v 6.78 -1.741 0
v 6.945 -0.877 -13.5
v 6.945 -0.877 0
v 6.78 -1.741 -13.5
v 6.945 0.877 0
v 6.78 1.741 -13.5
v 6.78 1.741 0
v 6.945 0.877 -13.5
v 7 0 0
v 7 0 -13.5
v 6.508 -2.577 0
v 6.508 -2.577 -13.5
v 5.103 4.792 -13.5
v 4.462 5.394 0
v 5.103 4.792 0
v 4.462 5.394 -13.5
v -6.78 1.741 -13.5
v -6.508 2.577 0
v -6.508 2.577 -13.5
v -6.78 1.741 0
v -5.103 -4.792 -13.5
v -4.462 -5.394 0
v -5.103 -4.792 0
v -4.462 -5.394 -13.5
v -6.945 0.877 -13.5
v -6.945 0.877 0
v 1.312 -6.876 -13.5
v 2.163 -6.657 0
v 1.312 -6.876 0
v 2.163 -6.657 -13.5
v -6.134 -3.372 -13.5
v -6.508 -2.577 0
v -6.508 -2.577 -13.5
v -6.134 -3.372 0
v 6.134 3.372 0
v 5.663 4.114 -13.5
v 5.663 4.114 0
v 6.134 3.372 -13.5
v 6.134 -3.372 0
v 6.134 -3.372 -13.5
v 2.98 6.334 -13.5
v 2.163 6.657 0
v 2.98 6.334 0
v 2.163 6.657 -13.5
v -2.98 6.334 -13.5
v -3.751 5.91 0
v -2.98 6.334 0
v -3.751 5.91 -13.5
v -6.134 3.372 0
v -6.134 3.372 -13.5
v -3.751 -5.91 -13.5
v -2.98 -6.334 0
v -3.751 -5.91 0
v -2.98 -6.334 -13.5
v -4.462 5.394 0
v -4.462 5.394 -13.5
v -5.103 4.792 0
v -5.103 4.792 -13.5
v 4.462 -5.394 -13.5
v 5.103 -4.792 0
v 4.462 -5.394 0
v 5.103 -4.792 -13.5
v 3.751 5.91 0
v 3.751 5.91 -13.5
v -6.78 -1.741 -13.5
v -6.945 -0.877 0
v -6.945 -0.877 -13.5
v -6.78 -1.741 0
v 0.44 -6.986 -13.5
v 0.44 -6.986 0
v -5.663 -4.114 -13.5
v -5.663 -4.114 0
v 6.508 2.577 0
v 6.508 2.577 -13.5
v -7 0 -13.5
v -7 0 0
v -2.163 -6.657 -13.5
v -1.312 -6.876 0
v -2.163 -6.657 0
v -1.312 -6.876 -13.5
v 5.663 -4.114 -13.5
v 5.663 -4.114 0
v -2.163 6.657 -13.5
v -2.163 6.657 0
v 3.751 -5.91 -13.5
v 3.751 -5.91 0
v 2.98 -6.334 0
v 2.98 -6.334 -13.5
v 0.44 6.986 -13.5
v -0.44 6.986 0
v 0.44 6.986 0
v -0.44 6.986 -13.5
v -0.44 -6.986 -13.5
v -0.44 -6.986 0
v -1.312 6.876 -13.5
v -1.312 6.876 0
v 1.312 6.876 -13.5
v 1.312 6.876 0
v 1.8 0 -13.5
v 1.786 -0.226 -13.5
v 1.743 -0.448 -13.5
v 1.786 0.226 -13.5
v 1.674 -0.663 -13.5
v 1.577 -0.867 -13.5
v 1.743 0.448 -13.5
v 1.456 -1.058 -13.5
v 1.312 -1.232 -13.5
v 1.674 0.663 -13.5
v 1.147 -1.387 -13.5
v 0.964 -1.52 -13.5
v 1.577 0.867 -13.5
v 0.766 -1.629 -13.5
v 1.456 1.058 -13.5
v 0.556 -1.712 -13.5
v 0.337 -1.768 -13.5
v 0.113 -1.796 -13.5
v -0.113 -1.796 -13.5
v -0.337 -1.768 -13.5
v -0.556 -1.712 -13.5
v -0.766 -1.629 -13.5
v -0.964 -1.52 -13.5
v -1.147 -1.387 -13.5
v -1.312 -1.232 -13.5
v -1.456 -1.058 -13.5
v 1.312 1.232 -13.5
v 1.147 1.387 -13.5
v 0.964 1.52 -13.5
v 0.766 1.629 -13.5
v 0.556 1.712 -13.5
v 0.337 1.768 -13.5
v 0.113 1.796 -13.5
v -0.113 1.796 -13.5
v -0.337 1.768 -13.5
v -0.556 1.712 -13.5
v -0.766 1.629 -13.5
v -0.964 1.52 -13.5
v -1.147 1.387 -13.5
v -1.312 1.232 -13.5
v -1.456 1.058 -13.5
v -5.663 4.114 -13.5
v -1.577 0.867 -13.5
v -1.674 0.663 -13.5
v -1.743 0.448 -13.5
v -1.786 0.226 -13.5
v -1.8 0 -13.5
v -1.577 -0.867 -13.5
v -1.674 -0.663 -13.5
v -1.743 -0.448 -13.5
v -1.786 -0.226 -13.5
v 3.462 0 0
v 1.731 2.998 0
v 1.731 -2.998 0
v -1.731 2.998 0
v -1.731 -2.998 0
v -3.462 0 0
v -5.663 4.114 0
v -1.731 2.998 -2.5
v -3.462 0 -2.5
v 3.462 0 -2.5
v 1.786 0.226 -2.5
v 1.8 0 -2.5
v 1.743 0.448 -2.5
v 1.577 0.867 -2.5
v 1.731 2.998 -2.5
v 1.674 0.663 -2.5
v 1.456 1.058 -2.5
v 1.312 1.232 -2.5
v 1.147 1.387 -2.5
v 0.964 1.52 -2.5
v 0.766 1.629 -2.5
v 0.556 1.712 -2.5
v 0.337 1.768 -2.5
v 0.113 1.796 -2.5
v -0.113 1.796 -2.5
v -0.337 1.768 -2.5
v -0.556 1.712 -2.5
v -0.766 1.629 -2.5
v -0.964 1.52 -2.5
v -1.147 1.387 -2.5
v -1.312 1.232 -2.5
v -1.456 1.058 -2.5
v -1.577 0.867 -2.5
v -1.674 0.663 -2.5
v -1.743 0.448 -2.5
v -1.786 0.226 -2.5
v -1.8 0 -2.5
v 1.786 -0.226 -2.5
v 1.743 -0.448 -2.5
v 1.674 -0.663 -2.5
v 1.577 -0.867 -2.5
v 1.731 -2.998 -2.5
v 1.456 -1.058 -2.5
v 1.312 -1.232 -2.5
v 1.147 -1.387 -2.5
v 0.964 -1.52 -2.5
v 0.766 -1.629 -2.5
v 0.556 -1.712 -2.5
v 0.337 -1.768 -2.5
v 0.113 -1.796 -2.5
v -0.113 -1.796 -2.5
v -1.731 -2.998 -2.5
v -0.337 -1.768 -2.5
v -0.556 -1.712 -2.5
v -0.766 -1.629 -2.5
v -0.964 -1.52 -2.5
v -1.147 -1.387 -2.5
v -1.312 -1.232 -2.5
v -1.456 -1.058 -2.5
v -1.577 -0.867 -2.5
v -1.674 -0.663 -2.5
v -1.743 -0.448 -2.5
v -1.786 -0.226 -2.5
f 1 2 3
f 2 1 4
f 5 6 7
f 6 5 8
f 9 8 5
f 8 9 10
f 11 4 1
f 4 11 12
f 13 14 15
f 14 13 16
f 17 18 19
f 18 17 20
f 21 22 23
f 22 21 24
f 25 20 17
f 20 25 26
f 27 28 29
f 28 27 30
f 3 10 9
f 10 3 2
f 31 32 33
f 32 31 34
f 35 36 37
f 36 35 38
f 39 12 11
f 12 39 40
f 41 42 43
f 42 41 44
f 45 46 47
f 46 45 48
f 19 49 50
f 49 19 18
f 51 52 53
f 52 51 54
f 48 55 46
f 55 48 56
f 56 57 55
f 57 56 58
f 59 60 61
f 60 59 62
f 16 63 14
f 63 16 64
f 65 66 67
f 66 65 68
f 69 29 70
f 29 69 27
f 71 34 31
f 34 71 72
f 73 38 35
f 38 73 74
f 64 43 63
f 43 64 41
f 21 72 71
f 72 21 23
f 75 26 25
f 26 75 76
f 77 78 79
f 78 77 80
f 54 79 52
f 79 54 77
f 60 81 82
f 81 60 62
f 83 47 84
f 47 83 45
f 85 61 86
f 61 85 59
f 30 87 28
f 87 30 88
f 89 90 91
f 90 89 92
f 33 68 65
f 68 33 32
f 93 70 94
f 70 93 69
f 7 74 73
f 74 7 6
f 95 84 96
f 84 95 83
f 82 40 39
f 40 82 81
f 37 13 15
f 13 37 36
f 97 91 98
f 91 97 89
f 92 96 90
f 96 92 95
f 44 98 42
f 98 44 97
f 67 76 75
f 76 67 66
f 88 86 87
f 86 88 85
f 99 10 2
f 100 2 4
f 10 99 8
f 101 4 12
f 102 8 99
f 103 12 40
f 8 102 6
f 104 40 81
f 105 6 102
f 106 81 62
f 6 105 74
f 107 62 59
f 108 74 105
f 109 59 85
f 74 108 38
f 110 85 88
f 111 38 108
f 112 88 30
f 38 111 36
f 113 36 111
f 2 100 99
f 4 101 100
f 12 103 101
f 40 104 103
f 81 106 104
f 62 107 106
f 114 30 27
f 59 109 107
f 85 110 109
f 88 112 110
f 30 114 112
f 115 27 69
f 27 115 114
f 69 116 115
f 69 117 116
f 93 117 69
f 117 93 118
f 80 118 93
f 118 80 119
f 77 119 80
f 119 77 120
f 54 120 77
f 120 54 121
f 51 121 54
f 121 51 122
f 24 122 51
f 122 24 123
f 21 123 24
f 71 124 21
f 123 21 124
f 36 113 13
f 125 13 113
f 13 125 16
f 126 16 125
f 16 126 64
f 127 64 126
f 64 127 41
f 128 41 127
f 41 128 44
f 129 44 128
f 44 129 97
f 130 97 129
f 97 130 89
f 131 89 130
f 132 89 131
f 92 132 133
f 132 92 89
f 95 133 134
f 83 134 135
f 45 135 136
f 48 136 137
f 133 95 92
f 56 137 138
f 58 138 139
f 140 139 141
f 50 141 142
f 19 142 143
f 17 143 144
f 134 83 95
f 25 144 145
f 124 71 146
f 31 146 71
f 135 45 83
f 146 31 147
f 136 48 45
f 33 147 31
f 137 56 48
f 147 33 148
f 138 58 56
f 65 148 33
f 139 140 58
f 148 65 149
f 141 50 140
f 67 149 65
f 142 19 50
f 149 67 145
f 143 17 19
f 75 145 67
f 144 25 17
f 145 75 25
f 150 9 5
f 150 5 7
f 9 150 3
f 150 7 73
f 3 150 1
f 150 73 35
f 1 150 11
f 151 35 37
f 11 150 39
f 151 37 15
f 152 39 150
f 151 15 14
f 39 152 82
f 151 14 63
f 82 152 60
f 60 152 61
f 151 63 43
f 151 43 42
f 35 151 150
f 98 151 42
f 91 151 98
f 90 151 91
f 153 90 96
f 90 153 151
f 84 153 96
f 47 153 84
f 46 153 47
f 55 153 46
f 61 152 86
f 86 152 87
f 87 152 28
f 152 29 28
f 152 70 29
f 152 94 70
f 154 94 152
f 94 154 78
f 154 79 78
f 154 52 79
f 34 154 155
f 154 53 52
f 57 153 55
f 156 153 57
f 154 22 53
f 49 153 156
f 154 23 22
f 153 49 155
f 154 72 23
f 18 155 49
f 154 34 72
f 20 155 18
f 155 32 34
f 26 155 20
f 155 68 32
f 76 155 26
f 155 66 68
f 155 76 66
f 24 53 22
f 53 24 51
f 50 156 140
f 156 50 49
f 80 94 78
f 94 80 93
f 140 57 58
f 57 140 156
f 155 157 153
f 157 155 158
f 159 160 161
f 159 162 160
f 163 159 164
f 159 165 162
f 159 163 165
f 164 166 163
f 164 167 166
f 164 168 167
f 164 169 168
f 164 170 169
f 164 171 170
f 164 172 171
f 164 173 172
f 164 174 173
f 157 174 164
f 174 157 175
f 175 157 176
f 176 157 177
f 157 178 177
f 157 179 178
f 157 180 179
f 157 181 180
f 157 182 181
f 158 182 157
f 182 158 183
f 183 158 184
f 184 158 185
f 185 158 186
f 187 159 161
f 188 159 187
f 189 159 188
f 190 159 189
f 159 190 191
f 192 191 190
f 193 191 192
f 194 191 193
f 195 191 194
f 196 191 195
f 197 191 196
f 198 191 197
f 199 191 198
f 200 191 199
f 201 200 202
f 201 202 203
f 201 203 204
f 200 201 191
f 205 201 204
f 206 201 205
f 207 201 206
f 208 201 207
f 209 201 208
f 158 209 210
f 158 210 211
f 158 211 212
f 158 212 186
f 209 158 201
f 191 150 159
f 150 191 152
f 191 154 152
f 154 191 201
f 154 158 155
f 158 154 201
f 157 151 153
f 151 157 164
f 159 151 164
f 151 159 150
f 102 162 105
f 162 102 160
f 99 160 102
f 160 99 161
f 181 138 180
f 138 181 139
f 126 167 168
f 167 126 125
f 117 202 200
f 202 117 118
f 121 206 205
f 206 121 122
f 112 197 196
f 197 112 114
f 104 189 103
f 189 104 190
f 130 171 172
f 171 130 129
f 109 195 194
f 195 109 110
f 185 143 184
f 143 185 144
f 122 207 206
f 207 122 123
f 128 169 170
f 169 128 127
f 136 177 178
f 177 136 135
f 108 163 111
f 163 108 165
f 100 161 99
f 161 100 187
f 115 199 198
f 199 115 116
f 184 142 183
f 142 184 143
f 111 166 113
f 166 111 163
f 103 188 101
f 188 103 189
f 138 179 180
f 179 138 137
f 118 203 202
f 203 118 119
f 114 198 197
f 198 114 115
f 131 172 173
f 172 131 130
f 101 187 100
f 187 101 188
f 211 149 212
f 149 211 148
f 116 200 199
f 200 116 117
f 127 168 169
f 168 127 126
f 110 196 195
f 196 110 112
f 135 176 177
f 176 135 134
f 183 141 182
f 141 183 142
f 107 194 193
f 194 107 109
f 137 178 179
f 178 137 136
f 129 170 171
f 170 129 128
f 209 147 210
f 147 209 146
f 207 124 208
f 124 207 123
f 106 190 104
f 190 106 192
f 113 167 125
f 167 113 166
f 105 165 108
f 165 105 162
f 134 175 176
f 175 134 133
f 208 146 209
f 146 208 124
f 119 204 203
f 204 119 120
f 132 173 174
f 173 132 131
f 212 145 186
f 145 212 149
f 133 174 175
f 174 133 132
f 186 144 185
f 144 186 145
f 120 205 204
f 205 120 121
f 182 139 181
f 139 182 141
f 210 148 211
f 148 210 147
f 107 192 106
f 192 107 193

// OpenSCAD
$fn = 50;


difference() {
	union() {
		translate(v = [0, 0, -13.5000000000]) {
			cylinder(h = 13.5000000000, r = 7.0000000000);
		}
		translate(v = [0, 0, -12.0000000000]) {
			cylinder(h = 12, r = 2.8750000000);
		}
	}
	union() {
		translate(v = [0, 0, 0]) {
			rotate(a = [0, 0, 0]) {
				difference() {
					union() {
						translate(v = [0, 0, -2.5000000000]) {
							linear_extrude(height = 2.5000000000) {
								polygon(points = [[3.4620000000, 0.0000000000], [1.7310000000, 2.9981799479], [-1.7310000000, 2.9981799479], [-3.4620000000, 0.0000000000], [-1.7310000000, -2.9981799479], [1.7310000000, -2.9981799479]]);
							}
						}
					}
					union();
				}
			}
		}
		#translate(v = [0, 0, -100.0000000000]) {
			cylinder(h = 200, r = 1.8000000000);
		}
	}
}
